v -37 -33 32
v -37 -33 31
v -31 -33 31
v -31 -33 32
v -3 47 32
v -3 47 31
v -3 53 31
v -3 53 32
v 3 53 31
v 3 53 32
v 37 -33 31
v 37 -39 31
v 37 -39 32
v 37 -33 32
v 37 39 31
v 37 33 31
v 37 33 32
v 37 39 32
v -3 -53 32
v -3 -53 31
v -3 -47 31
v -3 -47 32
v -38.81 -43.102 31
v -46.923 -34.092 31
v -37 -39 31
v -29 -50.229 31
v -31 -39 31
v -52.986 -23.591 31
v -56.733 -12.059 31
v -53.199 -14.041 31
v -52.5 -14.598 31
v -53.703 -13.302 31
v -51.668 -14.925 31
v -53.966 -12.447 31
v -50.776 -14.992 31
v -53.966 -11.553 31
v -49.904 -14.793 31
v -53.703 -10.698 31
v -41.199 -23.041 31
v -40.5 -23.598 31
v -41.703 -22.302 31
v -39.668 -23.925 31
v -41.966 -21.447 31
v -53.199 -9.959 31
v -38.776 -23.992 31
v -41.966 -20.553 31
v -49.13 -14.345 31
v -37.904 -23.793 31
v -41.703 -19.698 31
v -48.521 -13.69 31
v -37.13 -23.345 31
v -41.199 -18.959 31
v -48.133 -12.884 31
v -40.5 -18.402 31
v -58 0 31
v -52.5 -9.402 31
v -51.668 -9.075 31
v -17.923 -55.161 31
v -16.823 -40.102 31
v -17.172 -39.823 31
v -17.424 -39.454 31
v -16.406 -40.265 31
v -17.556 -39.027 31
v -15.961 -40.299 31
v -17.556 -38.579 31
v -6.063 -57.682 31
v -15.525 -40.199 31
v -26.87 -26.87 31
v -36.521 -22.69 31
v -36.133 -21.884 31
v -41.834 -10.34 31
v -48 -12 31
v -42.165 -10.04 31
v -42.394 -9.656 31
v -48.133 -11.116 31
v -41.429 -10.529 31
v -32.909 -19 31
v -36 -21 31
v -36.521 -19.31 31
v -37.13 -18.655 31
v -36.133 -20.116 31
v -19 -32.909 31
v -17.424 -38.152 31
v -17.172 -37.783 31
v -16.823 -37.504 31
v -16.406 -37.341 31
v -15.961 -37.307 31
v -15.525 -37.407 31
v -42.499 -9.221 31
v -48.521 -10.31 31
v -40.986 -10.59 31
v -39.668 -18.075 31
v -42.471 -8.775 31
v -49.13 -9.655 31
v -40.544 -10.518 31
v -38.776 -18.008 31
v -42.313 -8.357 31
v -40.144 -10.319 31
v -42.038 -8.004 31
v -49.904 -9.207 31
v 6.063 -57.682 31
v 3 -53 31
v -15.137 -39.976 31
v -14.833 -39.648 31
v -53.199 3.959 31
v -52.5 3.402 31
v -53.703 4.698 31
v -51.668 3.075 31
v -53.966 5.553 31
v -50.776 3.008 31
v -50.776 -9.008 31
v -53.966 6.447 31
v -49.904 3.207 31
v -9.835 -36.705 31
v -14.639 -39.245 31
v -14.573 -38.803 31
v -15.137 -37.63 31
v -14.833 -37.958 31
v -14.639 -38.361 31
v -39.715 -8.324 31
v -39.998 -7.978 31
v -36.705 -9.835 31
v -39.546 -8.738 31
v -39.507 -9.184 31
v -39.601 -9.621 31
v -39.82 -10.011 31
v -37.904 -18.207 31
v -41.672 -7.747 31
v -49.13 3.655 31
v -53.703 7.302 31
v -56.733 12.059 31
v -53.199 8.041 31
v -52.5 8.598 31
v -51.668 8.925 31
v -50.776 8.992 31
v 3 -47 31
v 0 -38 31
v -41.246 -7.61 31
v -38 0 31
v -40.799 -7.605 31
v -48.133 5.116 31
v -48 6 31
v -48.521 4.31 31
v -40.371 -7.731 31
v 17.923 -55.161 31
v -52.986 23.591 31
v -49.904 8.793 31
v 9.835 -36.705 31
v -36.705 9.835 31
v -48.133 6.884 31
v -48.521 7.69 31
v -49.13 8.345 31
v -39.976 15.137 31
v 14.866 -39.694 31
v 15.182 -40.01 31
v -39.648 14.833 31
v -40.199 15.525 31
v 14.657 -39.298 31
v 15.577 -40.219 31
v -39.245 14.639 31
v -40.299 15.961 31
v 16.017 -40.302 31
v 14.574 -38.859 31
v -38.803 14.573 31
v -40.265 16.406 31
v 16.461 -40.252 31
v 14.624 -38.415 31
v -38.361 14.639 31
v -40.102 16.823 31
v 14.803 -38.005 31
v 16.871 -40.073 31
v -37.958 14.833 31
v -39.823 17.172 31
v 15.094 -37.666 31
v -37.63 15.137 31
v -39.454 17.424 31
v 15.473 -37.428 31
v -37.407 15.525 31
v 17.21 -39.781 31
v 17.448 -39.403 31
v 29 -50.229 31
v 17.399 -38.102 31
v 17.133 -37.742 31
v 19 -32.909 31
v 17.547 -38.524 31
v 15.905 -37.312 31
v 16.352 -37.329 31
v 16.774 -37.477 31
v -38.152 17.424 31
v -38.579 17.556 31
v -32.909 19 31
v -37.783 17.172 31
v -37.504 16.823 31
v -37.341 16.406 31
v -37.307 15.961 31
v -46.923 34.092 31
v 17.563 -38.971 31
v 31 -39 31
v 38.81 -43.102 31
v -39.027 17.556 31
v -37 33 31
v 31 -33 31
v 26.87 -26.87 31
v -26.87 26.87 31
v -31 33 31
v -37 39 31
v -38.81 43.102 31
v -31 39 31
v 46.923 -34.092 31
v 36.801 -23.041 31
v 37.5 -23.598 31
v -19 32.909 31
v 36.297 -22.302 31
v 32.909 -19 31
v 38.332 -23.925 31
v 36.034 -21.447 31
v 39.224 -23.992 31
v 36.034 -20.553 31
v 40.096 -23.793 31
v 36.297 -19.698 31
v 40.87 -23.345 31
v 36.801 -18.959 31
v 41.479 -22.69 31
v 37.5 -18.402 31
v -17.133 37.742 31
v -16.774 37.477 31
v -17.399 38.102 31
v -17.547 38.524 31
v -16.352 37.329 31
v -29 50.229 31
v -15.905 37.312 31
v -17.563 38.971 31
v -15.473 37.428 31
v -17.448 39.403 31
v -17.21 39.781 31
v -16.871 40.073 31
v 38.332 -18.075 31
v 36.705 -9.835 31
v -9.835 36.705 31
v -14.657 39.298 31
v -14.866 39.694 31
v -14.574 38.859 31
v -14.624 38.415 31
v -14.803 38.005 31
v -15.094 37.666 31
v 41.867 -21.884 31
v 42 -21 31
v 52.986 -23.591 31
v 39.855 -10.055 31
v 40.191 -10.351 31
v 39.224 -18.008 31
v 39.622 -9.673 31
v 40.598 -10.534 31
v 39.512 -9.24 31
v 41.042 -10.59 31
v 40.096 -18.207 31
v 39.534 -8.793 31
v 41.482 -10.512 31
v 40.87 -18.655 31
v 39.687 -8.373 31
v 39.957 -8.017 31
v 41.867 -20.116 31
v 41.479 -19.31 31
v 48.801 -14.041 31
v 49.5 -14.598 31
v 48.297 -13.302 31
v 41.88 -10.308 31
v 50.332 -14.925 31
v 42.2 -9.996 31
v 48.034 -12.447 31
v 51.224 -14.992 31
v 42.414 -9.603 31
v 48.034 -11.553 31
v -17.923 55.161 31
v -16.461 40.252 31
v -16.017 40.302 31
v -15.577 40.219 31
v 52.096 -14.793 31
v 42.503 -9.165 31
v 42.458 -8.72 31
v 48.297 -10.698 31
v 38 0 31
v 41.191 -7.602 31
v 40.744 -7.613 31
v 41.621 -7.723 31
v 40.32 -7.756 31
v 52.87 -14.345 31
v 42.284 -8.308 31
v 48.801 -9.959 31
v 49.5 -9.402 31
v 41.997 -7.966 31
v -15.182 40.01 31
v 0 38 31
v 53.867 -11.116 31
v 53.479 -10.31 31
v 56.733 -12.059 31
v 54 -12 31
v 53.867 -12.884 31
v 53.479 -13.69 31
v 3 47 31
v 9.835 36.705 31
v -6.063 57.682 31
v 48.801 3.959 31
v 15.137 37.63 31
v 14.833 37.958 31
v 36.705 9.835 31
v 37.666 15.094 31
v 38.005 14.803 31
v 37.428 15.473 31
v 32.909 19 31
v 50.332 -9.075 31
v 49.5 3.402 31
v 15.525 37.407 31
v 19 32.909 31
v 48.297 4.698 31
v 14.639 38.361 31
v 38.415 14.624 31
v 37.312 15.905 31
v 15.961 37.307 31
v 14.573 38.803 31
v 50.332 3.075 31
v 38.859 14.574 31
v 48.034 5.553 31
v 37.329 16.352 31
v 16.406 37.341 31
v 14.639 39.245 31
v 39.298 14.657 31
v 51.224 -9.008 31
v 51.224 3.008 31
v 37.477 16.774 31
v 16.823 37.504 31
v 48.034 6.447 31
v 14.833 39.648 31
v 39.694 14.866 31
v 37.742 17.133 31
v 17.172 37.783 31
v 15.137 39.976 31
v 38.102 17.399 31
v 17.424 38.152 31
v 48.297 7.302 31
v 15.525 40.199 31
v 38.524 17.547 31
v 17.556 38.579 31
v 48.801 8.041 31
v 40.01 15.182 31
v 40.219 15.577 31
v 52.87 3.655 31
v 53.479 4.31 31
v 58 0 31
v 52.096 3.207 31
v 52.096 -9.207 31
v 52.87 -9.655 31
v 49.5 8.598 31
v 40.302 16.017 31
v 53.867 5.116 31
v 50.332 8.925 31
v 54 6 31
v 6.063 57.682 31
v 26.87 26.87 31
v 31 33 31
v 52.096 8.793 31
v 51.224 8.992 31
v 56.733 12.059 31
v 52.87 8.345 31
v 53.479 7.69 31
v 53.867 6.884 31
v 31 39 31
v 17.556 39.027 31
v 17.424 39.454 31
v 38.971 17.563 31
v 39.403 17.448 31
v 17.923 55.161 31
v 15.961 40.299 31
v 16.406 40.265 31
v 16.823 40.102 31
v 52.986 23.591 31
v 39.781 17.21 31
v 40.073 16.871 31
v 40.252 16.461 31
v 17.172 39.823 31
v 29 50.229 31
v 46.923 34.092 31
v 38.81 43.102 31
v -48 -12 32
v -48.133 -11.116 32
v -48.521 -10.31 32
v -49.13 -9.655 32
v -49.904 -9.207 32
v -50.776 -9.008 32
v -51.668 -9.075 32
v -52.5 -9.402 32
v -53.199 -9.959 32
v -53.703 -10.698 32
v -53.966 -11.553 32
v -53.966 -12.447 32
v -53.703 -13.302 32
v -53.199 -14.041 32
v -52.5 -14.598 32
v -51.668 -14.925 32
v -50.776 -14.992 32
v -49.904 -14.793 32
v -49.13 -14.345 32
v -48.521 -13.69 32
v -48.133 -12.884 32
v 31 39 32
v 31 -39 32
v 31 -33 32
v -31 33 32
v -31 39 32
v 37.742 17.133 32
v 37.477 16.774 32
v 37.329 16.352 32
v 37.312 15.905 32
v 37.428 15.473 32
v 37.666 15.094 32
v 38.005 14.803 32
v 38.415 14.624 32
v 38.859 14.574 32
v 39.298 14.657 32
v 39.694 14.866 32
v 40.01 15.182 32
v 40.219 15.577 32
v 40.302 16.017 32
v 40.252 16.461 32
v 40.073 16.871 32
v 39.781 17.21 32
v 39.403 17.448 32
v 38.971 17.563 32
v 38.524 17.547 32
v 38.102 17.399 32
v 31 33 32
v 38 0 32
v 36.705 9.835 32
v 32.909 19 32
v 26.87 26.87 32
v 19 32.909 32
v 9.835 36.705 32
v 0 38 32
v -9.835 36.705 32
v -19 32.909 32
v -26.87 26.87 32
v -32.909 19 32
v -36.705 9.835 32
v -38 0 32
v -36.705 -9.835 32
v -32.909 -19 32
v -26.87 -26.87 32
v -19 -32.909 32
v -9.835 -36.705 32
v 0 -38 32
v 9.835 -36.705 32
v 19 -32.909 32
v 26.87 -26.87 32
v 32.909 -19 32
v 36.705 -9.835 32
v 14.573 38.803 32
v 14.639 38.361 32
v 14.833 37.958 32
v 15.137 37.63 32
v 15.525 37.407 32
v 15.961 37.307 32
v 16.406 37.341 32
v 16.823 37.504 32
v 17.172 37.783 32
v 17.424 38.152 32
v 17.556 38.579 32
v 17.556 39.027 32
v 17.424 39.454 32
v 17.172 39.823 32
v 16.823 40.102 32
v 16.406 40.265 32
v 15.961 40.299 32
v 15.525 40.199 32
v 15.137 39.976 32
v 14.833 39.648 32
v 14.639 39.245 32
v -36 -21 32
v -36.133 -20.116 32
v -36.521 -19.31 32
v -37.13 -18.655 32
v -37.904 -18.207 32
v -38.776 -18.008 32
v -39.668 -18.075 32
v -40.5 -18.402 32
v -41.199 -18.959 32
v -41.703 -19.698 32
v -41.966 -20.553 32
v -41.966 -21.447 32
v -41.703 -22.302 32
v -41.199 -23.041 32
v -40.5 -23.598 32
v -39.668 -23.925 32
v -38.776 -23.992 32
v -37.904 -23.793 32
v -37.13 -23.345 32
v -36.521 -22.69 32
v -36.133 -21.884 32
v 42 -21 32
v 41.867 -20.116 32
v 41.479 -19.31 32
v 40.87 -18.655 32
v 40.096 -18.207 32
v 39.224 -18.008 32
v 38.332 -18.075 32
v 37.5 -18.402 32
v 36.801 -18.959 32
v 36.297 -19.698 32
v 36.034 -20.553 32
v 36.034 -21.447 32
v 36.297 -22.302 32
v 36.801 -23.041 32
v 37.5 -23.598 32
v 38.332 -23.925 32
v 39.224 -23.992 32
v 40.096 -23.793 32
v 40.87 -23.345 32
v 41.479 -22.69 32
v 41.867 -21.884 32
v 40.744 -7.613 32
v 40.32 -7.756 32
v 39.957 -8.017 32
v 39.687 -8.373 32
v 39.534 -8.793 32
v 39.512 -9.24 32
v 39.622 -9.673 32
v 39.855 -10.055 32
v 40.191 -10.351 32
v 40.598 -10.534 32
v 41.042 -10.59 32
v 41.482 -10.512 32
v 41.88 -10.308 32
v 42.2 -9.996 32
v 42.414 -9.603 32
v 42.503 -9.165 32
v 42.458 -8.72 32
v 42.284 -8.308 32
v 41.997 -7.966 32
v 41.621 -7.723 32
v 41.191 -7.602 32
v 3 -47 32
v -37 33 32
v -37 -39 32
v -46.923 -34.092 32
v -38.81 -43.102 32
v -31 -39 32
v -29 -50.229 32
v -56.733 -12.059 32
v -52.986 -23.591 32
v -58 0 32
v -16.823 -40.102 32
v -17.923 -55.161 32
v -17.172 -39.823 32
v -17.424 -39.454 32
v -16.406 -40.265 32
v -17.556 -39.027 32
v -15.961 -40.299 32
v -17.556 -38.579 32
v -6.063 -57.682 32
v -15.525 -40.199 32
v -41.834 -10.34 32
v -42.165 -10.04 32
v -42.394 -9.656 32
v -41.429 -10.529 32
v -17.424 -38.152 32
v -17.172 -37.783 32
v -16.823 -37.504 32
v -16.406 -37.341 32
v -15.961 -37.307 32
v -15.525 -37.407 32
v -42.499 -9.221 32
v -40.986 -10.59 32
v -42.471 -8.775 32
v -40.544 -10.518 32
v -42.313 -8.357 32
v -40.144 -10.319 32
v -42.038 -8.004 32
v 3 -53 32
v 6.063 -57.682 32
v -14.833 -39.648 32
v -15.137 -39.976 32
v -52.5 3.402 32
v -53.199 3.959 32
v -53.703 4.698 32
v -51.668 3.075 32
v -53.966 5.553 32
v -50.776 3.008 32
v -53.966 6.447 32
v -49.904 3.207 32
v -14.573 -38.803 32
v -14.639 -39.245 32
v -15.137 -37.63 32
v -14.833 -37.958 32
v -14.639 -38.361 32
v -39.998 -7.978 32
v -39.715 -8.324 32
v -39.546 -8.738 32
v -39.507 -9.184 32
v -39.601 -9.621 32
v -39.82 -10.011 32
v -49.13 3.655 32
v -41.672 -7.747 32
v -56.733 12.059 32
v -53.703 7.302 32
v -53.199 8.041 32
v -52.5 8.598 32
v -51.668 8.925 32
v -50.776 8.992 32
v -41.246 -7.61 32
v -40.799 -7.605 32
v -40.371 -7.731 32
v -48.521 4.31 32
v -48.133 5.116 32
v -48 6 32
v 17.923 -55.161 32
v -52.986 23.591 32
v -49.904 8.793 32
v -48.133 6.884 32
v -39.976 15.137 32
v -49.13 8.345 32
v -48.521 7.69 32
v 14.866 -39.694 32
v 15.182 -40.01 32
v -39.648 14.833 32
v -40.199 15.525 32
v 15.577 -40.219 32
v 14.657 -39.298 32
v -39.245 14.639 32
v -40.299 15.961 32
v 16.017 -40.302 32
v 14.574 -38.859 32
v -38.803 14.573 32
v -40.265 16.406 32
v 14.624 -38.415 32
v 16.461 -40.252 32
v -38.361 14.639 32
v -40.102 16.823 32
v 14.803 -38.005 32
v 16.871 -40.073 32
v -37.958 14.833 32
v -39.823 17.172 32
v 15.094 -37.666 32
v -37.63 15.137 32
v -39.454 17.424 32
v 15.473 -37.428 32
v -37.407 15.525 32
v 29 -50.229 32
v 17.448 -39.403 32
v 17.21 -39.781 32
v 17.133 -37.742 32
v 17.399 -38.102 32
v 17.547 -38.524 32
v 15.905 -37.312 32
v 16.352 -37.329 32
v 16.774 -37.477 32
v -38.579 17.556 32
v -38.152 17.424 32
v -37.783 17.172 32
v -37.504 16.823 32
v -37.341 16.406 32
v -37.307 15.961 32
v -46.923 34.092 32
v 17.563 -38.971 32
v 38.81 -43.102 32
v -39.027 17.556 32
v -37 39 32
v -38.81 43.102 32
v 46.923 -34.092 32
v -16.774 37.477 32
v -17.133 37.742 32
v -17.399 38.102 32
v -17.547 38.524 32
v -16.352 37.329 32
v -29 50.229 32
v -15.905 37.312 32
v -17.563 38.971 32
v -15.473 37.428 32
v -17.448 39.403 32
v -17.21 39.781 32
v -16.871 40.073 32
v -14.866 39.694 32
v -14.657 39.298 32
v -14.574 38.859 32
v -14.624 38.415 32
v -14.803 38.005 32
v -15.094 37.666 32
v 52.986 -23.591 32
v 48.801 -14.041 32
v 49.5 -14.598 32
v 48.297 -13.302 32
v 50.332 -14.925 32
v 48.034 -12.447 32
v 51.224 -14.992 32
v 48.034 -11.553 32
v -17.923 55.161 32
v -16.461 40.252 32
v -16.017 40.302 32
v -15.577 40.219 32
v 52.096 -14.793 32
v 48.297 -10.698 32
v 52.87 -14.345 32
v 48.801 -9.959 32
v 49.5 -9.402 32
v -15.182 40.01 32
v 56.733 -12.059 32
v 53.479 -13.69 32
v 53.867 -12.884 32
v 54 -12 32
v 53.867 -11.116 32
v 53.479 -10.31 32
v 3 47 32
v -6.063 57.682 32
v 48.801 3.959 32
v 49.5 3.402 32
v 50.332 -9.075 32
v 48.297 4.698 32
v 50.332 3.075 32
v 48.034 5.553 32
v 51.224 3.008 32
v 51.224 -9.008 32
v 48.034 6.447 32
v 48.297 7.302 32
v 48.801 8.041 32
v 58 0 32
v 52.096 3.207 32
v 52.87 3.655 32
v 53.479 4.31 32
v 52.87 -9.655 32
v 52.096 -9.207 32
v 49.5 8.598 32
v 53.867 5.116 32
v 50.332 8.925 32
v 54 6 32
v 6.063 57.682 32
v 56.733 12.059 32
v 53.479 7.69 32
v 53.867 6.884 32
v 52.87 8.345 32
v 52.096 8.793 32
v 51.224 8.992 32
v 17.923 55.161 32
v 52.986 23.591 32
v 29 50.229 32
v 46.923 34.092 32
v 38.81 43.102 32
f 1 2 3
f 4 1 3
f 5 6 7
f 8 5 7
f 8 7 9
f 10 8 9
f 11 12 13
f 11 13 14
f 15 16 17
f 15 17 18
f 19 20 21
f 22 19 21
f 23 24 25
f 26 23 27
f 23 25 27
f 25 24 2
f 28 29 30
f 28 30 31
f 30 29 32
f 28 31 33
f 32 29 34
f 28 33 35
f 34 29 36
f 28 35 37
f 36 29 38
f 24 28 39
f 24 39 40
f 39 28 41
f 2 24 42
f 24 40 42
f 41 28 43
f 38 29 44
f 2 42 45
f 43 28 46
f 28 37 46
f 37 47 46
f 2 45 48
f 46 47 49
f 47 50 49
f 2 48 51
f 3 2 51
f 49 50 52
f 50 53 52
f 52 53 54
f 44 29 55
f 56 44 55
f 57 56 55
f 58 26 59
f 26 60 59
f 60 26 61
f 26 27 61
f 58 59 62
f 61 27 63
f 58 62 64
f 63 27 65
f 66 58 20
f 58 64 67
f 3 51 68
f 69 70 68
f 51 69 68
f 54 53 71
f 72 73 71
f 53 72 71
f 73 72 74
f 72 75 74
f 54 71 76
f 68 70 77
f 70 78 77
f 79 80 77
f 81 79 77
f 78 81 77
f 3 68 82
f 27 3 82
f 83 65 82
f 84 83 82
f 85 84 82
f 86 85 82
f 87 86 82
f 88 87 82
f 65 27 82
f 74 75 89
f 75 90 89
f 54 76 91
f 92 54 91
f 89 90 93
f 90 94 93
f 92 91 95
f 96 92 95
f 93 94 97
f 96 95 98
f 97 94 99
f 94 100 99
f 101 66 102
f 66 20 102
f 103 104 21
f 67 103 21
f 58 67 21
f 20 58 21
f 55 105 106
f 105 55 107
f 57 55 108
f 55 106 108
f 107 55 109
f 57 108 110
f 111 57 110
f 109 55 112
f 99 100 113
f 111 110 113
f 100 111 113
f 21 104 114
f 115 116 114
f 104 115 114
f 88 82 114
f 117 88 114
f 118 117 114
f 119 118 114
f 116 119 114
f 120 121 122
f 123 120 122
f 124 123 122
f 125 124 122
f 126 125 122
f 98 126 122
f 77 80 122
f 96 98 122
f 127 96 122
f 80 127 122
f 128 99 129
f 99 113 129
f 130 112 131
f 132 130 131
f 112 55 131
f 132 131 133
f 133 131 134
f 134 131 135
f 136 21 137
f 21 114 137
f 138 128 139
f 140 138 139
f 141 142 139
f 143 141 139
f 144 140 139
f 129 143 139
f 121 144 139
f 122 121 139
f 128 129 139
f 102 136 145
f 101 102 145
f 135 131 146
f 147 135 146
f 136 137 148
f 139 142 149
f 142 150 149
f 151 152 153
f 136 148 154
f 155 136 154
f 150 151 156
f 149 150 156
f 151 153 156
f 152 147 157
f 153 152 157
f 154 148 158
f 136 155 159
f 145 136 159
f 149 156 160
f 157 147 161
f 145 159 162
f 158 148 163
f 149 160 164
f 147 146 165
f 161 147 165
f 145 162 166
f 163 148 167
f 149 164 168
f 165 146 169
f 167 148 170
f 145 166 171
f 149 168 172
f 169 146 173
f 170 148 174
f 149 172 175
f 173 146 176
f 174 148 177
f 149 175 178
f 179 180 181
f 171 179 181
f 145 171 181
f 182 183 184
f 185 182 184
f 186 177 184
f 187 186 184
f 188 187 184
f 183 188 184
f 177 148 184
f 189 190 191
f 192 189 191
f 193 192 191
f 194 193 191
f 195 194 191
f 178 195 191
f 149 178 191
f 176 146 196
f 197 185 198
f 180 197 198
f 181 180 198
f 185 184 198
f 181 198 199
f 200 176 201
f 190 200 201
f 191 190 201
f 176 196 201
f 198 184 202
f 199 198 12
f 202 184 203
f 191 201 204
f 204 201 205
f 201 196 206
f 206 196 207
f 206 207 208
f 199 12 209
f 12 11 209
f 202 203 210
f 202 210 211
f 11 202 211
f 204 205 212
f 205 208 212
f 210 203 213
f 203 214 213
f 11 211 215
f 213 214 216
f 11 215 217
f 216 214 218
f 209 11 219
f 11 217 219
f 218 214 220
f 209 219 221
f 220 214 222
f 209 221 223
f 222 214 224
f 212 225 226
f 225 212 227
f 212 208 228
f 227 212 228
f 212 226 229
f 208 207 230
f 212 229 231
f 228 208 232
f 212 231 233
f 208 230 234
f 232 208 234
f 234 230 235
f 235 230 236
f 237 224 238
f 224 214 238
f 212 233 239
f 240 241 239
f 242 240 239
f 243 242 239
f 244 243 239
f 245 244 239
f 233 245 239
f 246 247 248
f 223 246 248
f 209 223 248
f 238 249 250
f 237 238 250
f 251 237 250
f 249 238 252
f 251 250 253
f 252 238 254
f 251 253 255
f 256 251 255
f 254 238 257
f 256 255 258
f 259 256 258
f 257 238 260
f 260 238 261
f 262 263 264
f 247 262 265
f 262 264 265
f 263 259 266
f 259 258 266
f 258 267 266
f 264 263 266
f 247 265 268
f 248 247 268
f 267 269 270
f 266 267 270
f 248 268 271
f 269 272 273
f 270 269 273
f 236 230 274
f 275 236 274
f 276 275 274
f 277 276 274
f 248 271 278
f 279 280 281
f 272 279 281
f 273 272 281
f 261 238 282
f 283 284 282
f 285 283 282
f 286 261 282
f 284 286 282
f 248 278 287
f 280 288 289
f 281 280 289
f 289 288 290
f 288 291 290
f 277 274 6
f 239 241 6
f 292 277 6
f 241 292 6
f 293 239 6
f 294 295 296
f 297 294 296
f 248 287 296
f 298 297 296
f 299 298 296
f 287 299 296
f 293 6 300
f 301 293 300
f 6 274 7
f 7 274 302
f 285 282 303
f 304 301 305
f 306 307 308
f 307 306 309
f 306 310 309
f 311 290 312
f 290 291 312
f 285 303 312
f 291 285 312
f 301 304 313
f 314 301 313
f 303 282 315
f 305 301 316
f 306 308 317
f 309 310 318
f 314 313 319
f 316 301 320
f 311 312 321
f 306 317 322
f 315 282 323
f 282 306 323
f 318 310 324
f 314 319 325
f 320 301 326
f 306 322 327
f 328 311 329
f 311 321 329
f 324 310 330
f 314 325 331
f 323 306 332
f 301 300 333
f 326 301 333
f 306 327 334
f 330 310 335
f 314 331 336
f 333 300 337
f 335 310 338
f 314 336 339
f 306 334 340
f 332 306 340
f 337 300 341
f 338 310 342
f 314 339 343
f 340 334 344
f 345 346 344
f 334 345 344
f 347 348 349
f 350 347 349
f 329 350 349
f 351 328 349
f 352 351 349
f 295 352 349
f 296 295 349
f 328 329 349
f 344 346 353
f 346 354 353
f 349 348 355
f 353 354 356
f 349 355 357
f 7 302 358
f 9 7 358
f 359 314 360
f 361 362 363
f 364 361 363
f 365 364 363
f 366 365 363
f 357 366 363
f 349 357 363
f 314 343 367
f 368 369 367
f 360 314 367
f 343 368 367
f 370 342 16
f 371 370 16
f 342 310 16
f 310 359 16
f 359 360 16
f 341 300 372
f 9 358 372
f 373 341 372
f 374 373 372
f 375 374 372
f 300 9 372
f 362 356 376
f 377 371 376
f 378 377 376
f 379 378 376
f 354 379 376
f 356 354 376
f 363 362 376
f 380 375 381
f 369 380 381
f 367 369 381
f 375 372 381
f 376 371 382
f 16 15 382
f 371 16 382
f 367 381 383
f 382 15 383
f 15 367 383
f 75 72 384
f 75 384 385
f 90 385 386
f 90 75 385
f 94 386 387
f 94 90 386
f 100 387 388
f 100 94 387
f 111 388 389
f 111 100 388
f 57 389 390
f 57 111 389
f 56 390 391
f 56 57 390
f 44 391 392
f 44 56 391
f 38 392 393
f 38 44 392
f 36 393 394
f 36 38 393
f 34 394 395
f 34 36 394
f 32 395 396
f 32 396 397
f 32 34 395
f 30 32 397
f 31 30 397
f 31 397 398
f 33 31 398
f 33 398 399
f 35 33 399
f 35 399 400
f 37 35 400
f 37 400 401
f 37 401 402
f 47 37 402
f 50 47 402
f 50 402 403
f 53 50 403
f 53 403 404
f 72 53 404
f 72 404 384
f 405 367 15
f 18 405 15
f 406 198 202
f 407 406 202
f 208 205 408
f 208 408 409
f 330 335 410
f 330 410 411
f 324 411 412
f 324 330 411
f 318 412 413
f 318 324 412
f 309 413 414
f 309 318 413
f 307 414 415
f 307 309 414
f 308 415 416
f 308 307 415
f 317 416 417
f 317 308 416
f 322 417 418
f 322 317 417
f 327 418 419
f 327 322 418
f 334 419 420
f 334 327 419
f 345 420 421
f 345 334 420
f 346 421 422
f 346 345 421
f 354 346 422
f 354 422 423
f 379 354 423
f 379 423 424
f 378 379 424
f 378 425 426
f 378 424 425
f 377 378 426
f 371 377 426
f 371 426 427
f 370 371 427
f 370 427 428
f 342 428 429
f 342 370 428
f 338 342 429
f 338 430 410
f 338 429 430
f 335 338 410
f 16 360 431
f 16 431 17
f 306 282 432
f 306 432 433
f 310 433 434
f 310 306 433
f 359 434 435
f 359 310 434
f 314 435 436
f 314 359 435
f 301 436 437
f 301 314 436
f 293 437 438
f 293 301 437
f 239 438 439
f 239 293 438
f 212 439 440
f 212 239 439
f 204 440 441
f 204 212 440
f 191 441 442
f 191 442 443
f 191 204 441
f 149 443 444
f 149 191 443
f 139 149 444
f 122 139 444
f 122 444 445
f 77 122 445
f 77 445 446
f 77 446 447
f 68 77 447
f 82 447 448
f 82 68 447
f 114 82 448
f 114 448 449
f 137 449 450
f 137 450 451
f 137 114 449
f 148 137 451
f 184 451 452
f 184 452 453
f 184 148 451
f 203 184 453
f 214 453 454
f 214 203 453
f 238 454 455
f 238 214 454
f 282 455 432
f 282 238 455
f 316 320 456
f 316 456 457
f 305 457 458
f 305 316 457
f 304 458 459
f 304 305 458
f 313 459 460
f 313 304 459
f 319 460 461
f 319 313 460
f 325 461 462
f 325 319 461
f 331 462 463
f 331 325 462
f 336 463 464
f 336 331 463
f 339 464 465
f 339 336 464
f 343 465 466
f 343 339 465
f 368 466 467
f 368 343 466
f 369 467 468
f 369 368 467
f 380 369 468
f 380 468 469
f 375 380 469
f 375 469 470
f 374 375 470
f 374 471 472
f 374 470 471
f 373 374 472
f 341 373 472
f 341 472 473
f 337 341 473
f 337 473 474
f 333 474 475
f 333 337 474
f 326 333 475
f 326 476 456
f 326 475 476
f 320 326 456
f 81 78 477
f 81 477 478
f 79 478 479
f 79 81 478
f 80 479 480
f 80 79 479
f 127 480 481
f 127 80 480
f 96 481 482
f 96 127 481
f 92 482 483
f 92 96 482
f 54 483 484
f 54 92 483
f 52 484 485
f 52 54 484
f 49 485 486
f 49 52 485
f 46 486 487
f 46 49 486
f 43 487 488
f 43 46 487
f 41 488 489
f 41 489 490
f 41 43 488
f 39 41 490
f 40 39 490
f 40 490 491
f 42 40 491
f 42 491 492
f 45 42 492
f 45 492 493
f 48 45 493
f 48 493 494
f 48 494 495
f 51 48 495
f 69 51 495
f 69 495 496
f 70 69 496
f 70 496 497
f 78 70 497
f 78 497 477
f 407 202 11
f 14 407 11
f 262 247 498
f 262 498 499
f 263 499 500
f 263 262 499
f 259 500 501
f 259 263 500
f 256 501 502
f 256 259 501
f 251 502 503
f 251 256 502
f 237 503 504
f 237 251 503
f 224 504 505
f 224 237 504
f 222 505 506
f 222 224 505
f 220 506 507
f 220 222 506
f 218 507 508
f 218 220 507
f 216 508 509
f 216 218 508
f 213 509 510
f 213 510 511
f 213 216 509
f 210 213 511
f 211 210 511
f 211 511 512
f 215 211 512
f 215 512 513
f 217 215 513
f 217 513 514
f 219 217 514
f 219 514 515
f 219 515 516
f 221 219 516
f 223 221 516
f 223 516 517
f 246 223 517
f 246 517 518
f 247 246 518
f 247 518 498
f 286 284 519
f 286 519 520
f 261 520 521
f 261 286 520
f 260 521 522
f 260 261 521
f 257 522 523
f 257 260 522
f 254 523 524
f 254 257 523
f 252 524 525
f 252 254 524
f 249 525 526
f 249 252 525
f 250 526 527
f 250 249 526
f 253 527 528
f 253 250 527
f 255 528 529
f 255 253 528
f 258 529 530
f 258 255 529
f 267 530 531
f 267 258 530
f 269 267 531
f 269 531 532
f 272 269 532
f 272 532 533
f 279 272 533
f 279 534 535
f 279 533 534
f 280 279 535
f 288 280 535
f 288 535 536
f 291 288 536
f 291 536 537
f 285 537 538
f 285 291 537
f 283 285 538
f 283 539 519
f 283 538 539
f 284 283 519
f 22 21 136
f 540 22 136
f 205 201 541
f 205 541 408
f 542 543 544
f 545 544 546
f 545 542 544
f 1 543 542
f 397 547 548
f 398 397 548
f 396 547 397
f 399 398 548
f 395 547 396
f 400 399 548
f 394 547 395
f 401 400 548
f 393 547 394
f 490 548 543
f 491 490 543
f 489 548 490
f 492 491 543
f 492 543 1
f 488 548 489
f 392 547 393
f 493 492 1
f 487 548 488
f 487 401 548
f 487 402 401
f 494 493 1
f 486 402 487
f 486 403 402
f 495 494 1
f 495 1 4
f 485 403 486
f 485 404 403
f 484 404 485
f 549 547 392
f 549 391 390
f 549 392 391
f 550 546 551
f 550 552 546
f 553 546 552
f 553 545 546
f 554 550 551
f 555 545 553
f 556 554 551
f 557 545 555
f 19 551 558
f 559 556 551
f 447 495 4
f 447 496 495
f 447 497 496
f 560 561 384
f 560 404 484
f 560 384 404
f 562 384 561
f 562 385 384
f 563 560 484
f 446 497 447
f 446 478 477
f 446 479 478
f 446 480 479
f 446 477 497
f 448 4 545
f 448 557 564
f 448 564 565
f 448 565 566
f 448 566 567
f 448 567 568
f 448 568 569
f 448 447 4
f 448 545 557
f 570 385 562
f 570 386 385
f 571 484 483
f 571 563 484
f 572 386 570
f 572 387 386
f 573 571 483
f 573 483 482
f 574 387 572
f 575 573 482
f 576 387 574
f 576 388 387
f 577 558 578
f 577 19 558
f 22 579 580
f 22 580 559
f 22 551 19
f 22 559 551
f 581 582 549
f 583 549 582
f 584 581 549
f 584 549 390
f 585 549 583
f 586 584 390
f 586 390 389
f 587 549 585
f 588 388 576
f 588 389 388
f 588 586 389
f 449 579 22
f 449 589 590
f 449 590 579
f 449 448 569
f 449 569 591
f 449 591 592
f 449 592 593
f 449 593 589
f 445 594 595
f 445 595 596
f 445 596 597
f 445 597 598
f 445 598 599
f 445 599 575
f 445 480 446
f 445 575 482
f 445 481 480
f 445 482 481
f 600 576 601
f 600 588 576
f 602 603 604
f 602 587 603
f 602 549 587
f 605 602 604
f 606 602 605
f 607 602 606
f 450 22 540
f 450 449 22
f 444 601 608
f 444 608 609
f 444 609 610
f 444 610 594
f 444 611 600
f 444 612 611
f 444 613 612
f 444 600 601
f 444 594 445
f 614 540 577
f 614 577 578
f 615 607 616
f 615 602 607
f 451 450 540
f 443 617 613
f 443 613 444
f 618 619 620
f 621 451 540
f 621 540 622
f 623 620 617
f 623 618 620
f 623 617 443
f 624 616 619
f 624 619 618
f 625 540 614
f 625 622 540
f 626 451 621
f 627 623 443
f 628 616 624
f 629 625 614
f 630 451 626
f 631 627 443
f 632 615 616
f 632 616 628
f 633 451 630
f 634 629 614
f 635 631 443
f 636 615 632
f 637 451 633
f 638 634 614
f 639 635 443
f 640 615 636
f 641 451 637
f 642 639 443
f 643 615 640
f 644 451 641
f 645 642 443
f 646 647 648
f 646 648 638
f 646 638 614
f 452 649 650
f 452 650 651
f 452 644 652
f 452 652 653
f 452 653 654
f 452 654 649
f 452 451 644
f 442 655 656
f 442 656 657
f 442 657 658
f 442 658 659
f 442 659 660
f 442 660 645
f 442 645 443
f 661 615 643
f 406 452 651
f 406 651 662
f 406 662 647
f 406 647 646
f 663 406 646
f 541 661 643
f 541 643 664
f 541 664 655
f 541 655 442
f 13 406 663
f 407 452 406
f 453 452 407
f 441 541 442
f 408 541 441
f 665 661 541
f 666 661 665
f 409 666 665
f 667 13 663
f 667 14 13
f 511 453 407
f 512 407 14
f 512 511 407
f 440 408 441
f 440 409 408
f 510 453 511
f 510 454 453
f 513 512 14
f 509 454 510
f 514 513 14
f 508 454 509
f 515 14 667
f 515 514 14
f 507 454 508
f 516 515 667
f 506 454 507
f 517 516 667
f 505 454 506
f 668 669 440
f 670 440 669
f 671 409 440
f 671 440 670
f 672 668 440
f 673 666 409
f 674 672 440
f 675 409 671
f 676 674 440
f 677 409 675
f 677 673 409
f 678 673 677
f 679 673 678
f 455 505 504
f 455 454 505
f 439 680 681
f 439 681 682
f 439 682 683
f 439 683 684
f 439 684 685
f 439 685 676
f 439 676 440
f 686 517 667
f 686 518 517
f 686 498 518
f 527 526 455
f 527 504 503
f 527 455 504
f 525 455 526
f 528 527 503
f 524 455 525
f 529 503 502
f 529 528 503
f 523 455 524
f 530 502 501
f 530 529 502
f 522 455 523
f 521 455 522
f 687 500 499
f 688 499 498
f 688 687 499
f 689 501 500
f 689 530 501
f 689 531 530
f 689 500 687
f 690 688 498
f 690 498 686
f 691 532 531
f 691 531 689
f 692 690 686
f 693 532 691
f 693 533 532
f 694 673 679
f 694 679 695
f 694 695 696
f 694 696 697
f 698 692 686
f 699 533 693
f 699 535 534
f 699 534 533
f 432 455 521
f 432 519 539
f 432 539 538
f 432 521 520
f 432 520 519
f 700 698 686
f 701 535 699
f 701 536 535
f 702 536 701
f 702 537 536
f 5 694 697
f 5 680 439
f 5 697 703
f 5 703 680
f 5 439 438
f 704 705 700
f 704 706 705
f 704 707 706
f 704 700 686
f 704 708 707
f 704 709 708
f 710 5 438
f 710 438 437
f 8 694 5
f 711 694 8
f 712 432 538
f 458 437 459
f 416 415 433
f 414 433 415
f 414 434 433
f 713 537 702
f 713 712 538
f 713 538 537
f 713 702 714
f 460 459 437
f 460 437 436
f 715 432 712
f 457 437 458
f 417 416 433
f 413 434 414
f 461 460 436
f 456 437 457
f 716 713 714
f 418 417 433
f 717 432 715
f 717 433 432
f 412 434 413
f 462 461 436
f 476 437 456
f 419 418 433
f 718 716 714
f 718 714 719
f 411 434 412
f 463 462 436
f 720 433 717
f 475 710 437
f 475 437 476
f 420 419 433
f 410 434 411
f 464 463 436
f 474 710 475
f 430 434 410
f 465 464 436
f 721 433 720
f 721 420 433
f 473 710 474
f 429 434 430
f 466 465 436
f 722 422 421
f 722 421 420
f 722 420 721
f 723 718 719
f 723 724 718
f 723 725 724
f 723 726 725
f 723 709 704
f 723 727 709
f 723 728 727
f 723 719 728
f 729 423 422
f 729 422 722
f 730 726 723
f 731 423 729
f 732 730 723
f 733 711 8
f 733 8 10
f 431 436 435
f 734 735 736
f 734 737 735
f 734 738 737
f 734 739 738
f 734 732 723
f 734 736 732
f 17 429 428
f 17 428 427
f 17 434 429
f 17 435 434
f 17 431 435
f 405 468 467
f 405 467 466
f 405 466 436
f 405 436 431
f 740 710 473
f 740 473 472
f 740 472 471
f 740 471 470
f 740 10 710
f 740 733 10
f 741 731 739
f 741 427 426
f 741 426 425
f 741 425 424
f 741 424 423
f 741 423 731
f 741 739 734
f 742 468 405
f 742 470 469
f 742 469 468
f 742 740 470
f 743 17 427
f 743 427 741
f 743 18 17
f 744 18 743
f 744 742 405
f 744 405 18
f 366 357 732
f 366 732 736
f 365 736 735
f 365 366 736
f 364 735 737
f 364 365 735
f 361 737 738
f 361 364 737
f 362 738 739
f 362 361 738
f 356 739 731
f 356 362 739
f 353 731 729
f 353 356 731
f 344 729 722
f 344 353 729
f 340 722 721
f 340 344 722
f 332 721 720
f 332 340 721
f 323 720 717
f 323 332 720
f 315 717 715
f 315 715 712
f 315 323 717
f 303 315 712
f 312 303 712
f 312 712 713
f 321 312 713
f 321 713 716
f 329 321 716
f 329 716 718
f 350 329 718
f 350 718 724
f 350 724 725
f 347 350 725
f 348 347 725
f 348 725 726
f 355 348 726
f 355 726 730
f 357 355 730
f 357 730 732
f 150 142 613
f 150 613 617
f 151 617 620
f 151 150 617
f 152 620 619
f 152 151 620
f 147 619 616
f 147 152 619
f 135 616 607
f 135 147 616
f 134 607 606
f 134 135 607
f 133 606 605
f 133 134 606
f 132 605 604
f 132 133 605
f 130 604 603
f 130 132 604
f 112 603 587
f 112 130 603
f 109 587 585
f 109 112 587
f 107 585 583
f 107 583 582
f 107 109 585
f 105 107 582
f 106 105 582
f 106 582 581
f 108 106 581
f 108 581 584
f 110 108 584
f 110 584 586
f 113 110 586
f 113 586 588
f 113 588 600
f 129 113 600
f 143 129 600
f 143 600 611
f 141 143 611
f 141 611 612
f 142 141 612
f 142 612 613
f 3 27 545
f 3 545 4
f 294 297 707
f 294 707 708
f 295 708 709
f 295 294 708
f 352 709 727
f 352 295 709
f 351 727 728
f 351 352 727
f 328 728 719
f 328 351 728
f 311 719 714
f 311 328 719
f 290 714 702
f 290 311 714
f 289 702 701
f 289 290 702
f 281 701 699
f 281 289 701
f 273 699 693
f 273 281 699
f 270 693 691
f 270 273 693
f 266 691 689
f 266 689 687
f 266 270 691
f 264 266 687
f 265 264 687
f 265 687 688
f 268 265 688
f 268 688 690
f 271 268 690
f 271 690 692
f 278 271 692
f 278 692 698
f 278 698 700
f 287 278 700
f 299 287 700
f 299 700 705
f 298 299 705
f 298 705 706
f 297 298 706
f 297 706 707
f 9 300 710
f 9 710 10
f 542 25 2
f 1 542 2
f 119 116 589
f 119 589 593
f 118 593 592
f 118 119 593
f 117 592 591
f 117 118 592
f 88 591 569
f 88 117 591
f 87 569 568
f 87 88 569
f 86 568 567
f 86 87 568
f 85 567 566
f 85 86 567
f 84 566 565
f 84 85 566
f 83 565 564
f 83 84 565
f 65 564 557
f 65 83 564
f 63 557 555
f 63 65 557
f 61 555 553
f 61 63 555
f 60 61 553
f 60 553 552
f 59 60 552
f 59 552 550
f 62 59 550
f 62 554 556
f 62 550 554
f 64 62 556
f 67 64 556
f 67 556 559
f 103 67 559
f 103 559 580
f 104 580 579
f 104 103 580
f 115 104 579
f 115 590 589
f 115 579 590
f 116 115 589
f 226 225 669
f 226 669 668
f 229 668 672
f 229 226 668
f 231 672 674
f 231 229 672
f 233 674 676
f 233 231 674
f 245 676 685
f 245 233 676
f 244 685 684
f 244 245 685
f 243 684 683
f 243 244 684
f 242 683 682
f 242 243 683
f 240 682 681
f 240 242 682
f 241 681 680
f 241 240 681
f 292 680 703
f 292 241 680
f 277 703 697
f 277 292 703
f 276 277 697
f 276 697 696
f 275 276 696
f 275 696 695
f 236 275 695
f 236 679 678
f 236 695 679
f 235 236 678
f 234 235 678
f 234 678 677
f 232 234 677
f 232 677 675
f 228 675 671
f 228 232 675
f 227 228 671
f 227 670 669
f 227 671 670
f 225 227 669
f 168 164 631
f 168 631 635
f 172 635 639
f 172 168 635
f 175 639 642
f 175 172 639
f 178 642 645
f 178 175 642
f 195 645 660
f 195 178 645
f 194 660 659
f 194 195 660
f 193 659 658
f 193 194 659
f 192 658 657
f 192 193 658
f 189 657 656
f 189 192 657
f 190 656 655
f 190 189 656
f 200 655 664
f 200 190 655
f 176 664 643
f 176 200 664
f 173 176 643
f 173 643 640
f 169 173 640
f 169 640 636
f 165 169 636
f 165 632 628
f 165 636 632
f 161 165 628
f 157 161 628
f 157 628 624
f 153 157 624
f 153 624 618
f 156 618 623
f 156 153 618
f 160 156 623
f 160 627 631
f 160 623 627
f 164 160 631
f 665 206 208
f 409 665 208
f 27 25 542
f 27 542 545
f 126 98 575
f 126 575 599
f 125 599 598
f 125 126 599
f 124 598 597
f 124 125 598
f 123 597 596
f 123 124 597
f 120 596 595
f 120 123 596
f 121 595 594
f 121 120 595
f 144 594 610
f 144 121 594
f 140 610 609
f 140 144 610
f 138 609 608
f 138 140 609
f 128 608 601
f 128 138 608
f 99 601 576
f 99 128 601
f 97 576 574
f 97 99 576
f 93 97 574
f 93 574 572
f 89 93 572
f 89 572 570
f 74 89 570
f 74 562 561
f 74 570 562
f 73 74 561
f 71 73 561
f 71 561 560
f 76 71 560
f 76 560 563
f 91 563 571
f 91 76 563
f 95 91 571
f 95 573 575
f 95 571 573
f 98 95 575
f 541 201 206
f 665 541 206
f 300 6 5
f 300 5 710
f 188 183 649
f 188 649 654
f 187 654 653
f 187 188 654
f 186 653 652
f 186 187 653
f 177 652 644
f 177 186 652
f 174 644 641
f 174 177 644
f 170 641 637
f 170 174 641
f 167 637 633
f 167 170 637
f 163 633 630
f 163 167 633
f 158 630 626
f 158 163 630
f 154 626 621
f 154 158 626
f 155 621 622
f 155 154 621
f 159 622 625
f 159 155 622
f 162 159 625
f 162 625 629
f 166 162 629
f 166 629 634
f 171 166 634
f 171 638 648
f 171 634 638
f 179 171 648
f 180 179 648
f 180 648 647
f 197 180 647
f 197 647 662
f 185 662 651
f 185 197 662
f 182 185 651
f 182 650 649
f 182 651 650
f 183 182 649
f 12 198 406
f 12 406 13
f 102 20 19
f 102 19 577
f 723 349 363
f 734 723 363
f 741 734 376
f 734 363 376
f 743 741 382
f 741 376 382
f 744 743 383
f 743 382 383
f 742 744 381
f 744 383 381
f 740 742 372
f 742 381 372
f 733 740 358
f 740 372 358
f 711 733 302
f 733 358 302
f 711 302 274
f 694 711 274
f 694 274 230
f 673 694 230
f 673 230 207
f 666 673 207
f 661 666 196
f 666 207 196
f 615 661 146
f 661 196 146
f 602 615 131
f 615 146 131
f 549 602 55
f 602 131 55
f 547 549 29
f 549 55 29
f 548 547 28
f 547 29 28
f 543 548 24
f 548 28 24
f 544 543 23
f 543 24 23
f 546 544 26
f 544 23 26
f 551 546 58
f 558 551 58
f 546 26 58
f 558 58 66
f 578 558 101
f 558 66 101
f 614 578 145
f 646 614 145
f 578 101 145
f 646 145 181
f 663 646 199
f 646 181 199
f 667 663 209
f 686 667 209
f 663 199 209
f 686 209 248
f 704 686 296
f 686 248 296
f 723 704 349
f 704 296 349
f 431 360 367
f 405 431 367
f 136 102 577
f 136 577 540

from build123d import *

# Parameters (mm, degrees)
CYLINDER531_R               = 3
CYLINDER531_DEPTH           = 7
CYLINDER530_R               = 3
CYLINDER530_DEPTH           = 7
CYLINDER445_R               = 1.5
CYLINDER445_DEPTH           = 100
CYLINDER445_PLACEMENT_ANGLE = 100
CYLINDER446_R               = 1.5
CYLINDER446_DEPTH           = 100
CYLINDER446_PLACEMENT_ANGLE = 135
CYLINDER447_R               = 1.5
CYLINDER447_DEPTH           = 100
CYLINDER448_R               = 1.5
CYLINDER448_DEPTH           = 100
CYLINDER448_PLACEMENT_ANGLE = 225
CYLINDER449_R               = 1.5
CYLINDER449_DEPTH           = 100
CYLINDER450_R               = 1.5
CYLINDER450_DEPTH           = 100
CYLINDER450_PLACEMENT_ANGLE = 55
CYLINDER451_R               = 1.5
CYLINDER451_DEPTH           = 100
CYLINDER444_R               = 1.5
CYLINDER444_DEPTH           = 100
CYLINDER444_PLACEMENT_ANGLE = 45
BOX154_W                    = 6
BOX154_H                    = 6
BOX154_DEPTH                = 10
BOX151_W                    = 6
BOX151_H                    = 6
BOX151_DEPTH                = 10
BOX155_W                    = 6
BOX155_H                    = 6
BOX155_DEPTH                = 10
BOX153_W                    = 6
BOX153_H                    = 6
BOX153_DEPTH                = 10
BOX156_W                    = 6
BOX156_H                    = 6
BOX156_DEPTH                = 10
BOX152_W                    = 6
BOX152_H                    = 6
BOX152_DEPTH                = 10
CYLINDER407_R               = 3
CYLINDER407_DEPTH           = 7
CYLINDER405_R               = 3
CYLINDER405_DEPTH           = 7
CYLINDER404_R               = 3
CYLINDER404_DEPTH           = 7
CYLINDER406_R               = 3
CYLINDER406_DEPTH           = 7
TUBE020_R                   = 58
TUBE020_R_2                 = 38
TUBE020_DEPTH               = 1


with BuildPart() as v_lec531:
    # Cylinder531 → Cylinder531 (new body)
    with BuildSketch(Plane(origin=(39, -21, 50), x_dir=(1, 0, 0), z_dir=(0, 0, 1))):
        Circle(CYLINDER531_R)
    extrude(amount=CYLINDER531_DEPTH)


with BuildPart() as compound337:
    # Cylinder530 → Cylinder530 (new body)
    with BuildSketch(Plane(origin=(-39, -21, 50), x_dir=(1, 0, 0), z_dir=(0, 0, 1))):
        Circle(CYLINDER530_R)
    extrude(amount=CYLINDER530_DEPTH)

    # Compound337: union Válec531
    add(v_lec531.part)


with BuildPart() as compound337_1:
    # Compound337 placement: moved
    add(compound337.part.moved(Location((0, 0, -25))))


with BuildPart() as v_lec445:
    # Cylinder445 → Cylinder445 (new body)
    with BuildSketch(Plane.XY):
        Circle(CYLINDER445_R)
    extrude(amount=CYLINDER445_DEPTH)


with BuildPart() as v_lec445_1:
    # Cylinder445 placement: moved
    add(v_lec445.part.moved(Location((41.004432, -9.090464, 0))).rotate(Axis((41.004432, -9.090464, 0), (0, 0, 1)), CYLINDER445_PLACEMENT_ANGLE))


with BuildPart() as v_lec446:
    # Cylinder446 → Cylinder446 (new body)
    with BuildSketch(Plane.XY):
        Circle(CYLINDER446_R)
    extrude(amount=CYLINDER446_DEPTH)


with BuildPart() as v_lec446_1:
    # Cylinder446 placement: moved
    add(v_lec446.part.moved(Location((38.80294, 16.072704, 0))).rotate(Axis((38.80294, 16.072704, 0), (0, 0, 1)), CYLINDER446_PLACEMENT_ANGLE))


with BuildPart() as v_lec447:
    # Cylinder447 → Cylinder447 (new body)
    with BuildSketch(Plane(origin=(16.072704, 38.80294, 0), x_dir=(-1, 0, 0), z_dir=(0, 0, 1))):
        Circle(CYLINDER447_R)
    extrude(amount=CYLINDER447_DEPTH)


with BuildPart() as v_lec448:
    # Cylinder448 → Cylinder448 (new body)
    with BuildSketch(Plane.XY):
        Circle(CYLINDER448_R)
    extrude(amount=CYLINDER448_DEPTH)


with BuildPart() as v_lec448_1:
    # Cylinder448 placement: moved
    add(v_lec448.part.moved(Location((-16.072704, 38.80294, 0))).rotate(Axis((-16.072704, 38.80294, 0), (0, 0, 1)), CYLINDER448_PLACEMENT_ANGLE))


with BuildPart() as v_lec449:
    # Cylinder449 → Cylinder449 (new body)
    with BuildSketch(Plane(origin=(-38.80294, 16.072704, 0), x_dir=(0, -1, 0), z_dir=(0, 0, 1))):
        Circle(CYLINDER449_R)
    extrude(amount=CYLINDER449_DEPTH)


with BuildPart() as v_lec450:
    # Cylinder450 → Cylinder450 (new body)
    with BuildSketch(Plane.XY):
        Circle(CYLINDER450_R)
    extrude(amount=CYLINDER450_DEPTH)


with BuildPart() as v_lec450_1:
    # Cylinder450 placement: moved
    add(v_lec450.part.moved(Location((-41.004432, -9.090464, 0))).rotate(Axis((-41.004432, -9.090464, 0), (0, 0, -1)), CYLINDER450_PLACEMENT_ANGLE))


with BuildPart() as v_lec451:
    # Cylinder451 → Cylinder451 (new body)
    with BuildSketch(Plane(origin=(-16.072704, -38.80294, 0), x_dir=(1, 0, 0), z_dir=(0, 0, 1))):
        Circle(CYLINDER451_R)
    extrude(amount=CYLINDER451_DEPTH)


with BuildPart() as compound325:
    # Cylinder444 → Cylinder444 (new body)
    with BuildSketch(Plane.XY):
        Circle(CYLINDER444_R)
    extrude(amount=CYLINDER444_DEPTH)


with BuildPart() as compound325_1:
    # Cylinder444 placement: moved
    add(compound325.part.moved(Location((16.072704, -38.80294, 0))).rotate(Axis((16.072704, -38.80294, 0), (0, 0, 1)), CYLINDER444_PLACEMENT_ANGLE))

    # Compound325: union Válec445, Válec446, Válec447, Válec448, Válec449, Válec450, Válec451
    add(v_lec445_1.part)
    add(v_lec446_1.part)
    add(v_lec447.part)
    add(v_lec448_1.part)
    add(v_lec449.part)
    add(v_lec450_1.part)
    add(v_lec451.part)


with BuildPart() as krychle154:
    # Box154 → Box154 (new body)
    with BuildSketch(Plane(origin=(-37, -39, 40), x_dir=(1, 0, 0), z_dir=(0, 0, 1))):
        with Locations((3, 3)):
            Rectangle(BOX154_W, BOX154_H)
    extrude(amount=BOX154_DEPTH)


with BuildPart() as krychle151:
    # Box151 → Box151 (new body)
    with BuildSketch(Plane(origin=(-3, -53, 40), x_dir=(1, 0, 0), z_dir=(0, 0, 1))):
        with Locations((3, 3)):
            Rectangle(BOX151_W, BOX151_H)
    extrude(amount=BOX151_DEPTH)


with BuildPart() as krychle155:
    # Box155 → Box155 (new body)
    with BuildSketch(Plane(origin=(31, 33, 40), x_dir=(1, 0, 0), z_dir=(0, 0, 1))):
        with Locations((3, 3)):
            Rectangle(BOX155_W, BOX155_H)
    extrude(amount=BOX155_DEPTH)


with BuildPart() as krychle153:
    # Box153 → Box153 (new body)
    with BuildSketch(Plane(origin=(-37, 33, 40), x_dir=(1, 0, 0), z_dir=(0, 0, 1))):
        with Locations((3, 3)):
            Rectangle(BOX153_W, BOX153_H)
    extrude(amount=BOX153_DEPTH)


with BuildPart() as krychle156:
    # Box156 → Box156 (new body)
    with BuildSketch(Plane(origin=(31, -39, 40), x_dir=(1, 0, 0), z_dir=(0, 0, 1))):
        with Locations((3, 3)):
            Rectangle(BOX156_W, BOX156_H)
    extrude(amount=BOX156_DEPTH)


with BuildPart() as compound316:
    # Box152 → Box152 (new body)
    with BuildSketch(Plane(origin=(-3, 47, 40), x_dir=(1, 0, 0), z_dir=(0, 0, 1))):
        with Locations((3, 3)):
            Rectangle(BOX152_W, BOX152_H)
    extrude(amount=BOX152_DEPTH)

    # Compound316: union Krychle154, Krychle151, Krychle155, Krychle153, Krychle156
    add(krychle154.part)
    add(krychle151.part)
    add(krychle155.part)
    add(krychle153.part)
    add(krychle156.part)


with BuildPart() as compound316_1:
    # Compound316 placement: moved
    add(compound316.part.moved(Location((0, 0, -18))))


with BuildPart() as v_lec407:
    # Cylinder407 → Cylinder407 (new body)
    with BuildSketch(Plane(origin=(51, -12, 50), x_dir=(1, 0, 0), z_dir=(0, 0, 1))):
        Circle(CYLINDER407_R)
    extrude(amount=CYLINDER407_DEPTH)


with BuildPart() as v_lec405:
    # Cylinder405 → Cylinder405 (new body)
    with BuildSketch(Plane(origin=(51, 6, 50), x_dir=(1, 0, 0), z_dir=(0, 0, 1))):
        Circle(CYLINDER405_R)
    extrude(amount=CYLINDER405_DEPTH)


with BuildPart() as v_lec404:
    # Cylinder404 → Cylinder404 (new body)
    with BuildSketch(Plane(origin=(-51, 6, 50), x_dir=(1, 0, 0), z_dir=(0, 0, 1))):
        Circle(CYLINDER404_R)
    extrude(amount=CYLINDER404_DEPTH)


with BuildPart() as compound312:
    # Cylinder406 → Cylinder406 (new body)
    with BuildSketch(Plane(origin=(-51, -12, 50), x_dir=(1, 0, 0), z_dir=(0, 0, 1))):
        Circle(CYLINDER406_R)
    extrude(amount=CYLINDER406_DEPTH)

    # Compound312: union Válec407, Válec405, Válec404
    add(v_lec407.part)
    add(v_lec405.part)
    add(v_lec404.part)


with BuildPart() as compound312_1:
    # Compound312 placement: moved
    add(compound312.part.moved(Location((0, 0, -25))))


with BuildPart() as cut:
    # Tube020 → Tube020 (new body)
    with BuildSketch(Plane.XY.offset(31)):
        Circle(TUBE020_R)
        Circle(TUBE020_R_2, mode=Mode.SUBTRACT)
    extrude(amount=TUBE020_DEPTH)

    # Cut161: cut Compound312
    add(compound312_1.part, mode=Mode.SUBTRACT)

    # Cut163: cut Compound316
    add(compound316_1.part, mode=Mode.SUBTRACT)

    # Cut173: cut Compound325
    add(compound325_1.part, mode=Mode.SUBTRACT)

    # Cut: cut Compound337
    add(compound337_1.part, mode=Mode.SUBTRACT)


solid = cut.part
